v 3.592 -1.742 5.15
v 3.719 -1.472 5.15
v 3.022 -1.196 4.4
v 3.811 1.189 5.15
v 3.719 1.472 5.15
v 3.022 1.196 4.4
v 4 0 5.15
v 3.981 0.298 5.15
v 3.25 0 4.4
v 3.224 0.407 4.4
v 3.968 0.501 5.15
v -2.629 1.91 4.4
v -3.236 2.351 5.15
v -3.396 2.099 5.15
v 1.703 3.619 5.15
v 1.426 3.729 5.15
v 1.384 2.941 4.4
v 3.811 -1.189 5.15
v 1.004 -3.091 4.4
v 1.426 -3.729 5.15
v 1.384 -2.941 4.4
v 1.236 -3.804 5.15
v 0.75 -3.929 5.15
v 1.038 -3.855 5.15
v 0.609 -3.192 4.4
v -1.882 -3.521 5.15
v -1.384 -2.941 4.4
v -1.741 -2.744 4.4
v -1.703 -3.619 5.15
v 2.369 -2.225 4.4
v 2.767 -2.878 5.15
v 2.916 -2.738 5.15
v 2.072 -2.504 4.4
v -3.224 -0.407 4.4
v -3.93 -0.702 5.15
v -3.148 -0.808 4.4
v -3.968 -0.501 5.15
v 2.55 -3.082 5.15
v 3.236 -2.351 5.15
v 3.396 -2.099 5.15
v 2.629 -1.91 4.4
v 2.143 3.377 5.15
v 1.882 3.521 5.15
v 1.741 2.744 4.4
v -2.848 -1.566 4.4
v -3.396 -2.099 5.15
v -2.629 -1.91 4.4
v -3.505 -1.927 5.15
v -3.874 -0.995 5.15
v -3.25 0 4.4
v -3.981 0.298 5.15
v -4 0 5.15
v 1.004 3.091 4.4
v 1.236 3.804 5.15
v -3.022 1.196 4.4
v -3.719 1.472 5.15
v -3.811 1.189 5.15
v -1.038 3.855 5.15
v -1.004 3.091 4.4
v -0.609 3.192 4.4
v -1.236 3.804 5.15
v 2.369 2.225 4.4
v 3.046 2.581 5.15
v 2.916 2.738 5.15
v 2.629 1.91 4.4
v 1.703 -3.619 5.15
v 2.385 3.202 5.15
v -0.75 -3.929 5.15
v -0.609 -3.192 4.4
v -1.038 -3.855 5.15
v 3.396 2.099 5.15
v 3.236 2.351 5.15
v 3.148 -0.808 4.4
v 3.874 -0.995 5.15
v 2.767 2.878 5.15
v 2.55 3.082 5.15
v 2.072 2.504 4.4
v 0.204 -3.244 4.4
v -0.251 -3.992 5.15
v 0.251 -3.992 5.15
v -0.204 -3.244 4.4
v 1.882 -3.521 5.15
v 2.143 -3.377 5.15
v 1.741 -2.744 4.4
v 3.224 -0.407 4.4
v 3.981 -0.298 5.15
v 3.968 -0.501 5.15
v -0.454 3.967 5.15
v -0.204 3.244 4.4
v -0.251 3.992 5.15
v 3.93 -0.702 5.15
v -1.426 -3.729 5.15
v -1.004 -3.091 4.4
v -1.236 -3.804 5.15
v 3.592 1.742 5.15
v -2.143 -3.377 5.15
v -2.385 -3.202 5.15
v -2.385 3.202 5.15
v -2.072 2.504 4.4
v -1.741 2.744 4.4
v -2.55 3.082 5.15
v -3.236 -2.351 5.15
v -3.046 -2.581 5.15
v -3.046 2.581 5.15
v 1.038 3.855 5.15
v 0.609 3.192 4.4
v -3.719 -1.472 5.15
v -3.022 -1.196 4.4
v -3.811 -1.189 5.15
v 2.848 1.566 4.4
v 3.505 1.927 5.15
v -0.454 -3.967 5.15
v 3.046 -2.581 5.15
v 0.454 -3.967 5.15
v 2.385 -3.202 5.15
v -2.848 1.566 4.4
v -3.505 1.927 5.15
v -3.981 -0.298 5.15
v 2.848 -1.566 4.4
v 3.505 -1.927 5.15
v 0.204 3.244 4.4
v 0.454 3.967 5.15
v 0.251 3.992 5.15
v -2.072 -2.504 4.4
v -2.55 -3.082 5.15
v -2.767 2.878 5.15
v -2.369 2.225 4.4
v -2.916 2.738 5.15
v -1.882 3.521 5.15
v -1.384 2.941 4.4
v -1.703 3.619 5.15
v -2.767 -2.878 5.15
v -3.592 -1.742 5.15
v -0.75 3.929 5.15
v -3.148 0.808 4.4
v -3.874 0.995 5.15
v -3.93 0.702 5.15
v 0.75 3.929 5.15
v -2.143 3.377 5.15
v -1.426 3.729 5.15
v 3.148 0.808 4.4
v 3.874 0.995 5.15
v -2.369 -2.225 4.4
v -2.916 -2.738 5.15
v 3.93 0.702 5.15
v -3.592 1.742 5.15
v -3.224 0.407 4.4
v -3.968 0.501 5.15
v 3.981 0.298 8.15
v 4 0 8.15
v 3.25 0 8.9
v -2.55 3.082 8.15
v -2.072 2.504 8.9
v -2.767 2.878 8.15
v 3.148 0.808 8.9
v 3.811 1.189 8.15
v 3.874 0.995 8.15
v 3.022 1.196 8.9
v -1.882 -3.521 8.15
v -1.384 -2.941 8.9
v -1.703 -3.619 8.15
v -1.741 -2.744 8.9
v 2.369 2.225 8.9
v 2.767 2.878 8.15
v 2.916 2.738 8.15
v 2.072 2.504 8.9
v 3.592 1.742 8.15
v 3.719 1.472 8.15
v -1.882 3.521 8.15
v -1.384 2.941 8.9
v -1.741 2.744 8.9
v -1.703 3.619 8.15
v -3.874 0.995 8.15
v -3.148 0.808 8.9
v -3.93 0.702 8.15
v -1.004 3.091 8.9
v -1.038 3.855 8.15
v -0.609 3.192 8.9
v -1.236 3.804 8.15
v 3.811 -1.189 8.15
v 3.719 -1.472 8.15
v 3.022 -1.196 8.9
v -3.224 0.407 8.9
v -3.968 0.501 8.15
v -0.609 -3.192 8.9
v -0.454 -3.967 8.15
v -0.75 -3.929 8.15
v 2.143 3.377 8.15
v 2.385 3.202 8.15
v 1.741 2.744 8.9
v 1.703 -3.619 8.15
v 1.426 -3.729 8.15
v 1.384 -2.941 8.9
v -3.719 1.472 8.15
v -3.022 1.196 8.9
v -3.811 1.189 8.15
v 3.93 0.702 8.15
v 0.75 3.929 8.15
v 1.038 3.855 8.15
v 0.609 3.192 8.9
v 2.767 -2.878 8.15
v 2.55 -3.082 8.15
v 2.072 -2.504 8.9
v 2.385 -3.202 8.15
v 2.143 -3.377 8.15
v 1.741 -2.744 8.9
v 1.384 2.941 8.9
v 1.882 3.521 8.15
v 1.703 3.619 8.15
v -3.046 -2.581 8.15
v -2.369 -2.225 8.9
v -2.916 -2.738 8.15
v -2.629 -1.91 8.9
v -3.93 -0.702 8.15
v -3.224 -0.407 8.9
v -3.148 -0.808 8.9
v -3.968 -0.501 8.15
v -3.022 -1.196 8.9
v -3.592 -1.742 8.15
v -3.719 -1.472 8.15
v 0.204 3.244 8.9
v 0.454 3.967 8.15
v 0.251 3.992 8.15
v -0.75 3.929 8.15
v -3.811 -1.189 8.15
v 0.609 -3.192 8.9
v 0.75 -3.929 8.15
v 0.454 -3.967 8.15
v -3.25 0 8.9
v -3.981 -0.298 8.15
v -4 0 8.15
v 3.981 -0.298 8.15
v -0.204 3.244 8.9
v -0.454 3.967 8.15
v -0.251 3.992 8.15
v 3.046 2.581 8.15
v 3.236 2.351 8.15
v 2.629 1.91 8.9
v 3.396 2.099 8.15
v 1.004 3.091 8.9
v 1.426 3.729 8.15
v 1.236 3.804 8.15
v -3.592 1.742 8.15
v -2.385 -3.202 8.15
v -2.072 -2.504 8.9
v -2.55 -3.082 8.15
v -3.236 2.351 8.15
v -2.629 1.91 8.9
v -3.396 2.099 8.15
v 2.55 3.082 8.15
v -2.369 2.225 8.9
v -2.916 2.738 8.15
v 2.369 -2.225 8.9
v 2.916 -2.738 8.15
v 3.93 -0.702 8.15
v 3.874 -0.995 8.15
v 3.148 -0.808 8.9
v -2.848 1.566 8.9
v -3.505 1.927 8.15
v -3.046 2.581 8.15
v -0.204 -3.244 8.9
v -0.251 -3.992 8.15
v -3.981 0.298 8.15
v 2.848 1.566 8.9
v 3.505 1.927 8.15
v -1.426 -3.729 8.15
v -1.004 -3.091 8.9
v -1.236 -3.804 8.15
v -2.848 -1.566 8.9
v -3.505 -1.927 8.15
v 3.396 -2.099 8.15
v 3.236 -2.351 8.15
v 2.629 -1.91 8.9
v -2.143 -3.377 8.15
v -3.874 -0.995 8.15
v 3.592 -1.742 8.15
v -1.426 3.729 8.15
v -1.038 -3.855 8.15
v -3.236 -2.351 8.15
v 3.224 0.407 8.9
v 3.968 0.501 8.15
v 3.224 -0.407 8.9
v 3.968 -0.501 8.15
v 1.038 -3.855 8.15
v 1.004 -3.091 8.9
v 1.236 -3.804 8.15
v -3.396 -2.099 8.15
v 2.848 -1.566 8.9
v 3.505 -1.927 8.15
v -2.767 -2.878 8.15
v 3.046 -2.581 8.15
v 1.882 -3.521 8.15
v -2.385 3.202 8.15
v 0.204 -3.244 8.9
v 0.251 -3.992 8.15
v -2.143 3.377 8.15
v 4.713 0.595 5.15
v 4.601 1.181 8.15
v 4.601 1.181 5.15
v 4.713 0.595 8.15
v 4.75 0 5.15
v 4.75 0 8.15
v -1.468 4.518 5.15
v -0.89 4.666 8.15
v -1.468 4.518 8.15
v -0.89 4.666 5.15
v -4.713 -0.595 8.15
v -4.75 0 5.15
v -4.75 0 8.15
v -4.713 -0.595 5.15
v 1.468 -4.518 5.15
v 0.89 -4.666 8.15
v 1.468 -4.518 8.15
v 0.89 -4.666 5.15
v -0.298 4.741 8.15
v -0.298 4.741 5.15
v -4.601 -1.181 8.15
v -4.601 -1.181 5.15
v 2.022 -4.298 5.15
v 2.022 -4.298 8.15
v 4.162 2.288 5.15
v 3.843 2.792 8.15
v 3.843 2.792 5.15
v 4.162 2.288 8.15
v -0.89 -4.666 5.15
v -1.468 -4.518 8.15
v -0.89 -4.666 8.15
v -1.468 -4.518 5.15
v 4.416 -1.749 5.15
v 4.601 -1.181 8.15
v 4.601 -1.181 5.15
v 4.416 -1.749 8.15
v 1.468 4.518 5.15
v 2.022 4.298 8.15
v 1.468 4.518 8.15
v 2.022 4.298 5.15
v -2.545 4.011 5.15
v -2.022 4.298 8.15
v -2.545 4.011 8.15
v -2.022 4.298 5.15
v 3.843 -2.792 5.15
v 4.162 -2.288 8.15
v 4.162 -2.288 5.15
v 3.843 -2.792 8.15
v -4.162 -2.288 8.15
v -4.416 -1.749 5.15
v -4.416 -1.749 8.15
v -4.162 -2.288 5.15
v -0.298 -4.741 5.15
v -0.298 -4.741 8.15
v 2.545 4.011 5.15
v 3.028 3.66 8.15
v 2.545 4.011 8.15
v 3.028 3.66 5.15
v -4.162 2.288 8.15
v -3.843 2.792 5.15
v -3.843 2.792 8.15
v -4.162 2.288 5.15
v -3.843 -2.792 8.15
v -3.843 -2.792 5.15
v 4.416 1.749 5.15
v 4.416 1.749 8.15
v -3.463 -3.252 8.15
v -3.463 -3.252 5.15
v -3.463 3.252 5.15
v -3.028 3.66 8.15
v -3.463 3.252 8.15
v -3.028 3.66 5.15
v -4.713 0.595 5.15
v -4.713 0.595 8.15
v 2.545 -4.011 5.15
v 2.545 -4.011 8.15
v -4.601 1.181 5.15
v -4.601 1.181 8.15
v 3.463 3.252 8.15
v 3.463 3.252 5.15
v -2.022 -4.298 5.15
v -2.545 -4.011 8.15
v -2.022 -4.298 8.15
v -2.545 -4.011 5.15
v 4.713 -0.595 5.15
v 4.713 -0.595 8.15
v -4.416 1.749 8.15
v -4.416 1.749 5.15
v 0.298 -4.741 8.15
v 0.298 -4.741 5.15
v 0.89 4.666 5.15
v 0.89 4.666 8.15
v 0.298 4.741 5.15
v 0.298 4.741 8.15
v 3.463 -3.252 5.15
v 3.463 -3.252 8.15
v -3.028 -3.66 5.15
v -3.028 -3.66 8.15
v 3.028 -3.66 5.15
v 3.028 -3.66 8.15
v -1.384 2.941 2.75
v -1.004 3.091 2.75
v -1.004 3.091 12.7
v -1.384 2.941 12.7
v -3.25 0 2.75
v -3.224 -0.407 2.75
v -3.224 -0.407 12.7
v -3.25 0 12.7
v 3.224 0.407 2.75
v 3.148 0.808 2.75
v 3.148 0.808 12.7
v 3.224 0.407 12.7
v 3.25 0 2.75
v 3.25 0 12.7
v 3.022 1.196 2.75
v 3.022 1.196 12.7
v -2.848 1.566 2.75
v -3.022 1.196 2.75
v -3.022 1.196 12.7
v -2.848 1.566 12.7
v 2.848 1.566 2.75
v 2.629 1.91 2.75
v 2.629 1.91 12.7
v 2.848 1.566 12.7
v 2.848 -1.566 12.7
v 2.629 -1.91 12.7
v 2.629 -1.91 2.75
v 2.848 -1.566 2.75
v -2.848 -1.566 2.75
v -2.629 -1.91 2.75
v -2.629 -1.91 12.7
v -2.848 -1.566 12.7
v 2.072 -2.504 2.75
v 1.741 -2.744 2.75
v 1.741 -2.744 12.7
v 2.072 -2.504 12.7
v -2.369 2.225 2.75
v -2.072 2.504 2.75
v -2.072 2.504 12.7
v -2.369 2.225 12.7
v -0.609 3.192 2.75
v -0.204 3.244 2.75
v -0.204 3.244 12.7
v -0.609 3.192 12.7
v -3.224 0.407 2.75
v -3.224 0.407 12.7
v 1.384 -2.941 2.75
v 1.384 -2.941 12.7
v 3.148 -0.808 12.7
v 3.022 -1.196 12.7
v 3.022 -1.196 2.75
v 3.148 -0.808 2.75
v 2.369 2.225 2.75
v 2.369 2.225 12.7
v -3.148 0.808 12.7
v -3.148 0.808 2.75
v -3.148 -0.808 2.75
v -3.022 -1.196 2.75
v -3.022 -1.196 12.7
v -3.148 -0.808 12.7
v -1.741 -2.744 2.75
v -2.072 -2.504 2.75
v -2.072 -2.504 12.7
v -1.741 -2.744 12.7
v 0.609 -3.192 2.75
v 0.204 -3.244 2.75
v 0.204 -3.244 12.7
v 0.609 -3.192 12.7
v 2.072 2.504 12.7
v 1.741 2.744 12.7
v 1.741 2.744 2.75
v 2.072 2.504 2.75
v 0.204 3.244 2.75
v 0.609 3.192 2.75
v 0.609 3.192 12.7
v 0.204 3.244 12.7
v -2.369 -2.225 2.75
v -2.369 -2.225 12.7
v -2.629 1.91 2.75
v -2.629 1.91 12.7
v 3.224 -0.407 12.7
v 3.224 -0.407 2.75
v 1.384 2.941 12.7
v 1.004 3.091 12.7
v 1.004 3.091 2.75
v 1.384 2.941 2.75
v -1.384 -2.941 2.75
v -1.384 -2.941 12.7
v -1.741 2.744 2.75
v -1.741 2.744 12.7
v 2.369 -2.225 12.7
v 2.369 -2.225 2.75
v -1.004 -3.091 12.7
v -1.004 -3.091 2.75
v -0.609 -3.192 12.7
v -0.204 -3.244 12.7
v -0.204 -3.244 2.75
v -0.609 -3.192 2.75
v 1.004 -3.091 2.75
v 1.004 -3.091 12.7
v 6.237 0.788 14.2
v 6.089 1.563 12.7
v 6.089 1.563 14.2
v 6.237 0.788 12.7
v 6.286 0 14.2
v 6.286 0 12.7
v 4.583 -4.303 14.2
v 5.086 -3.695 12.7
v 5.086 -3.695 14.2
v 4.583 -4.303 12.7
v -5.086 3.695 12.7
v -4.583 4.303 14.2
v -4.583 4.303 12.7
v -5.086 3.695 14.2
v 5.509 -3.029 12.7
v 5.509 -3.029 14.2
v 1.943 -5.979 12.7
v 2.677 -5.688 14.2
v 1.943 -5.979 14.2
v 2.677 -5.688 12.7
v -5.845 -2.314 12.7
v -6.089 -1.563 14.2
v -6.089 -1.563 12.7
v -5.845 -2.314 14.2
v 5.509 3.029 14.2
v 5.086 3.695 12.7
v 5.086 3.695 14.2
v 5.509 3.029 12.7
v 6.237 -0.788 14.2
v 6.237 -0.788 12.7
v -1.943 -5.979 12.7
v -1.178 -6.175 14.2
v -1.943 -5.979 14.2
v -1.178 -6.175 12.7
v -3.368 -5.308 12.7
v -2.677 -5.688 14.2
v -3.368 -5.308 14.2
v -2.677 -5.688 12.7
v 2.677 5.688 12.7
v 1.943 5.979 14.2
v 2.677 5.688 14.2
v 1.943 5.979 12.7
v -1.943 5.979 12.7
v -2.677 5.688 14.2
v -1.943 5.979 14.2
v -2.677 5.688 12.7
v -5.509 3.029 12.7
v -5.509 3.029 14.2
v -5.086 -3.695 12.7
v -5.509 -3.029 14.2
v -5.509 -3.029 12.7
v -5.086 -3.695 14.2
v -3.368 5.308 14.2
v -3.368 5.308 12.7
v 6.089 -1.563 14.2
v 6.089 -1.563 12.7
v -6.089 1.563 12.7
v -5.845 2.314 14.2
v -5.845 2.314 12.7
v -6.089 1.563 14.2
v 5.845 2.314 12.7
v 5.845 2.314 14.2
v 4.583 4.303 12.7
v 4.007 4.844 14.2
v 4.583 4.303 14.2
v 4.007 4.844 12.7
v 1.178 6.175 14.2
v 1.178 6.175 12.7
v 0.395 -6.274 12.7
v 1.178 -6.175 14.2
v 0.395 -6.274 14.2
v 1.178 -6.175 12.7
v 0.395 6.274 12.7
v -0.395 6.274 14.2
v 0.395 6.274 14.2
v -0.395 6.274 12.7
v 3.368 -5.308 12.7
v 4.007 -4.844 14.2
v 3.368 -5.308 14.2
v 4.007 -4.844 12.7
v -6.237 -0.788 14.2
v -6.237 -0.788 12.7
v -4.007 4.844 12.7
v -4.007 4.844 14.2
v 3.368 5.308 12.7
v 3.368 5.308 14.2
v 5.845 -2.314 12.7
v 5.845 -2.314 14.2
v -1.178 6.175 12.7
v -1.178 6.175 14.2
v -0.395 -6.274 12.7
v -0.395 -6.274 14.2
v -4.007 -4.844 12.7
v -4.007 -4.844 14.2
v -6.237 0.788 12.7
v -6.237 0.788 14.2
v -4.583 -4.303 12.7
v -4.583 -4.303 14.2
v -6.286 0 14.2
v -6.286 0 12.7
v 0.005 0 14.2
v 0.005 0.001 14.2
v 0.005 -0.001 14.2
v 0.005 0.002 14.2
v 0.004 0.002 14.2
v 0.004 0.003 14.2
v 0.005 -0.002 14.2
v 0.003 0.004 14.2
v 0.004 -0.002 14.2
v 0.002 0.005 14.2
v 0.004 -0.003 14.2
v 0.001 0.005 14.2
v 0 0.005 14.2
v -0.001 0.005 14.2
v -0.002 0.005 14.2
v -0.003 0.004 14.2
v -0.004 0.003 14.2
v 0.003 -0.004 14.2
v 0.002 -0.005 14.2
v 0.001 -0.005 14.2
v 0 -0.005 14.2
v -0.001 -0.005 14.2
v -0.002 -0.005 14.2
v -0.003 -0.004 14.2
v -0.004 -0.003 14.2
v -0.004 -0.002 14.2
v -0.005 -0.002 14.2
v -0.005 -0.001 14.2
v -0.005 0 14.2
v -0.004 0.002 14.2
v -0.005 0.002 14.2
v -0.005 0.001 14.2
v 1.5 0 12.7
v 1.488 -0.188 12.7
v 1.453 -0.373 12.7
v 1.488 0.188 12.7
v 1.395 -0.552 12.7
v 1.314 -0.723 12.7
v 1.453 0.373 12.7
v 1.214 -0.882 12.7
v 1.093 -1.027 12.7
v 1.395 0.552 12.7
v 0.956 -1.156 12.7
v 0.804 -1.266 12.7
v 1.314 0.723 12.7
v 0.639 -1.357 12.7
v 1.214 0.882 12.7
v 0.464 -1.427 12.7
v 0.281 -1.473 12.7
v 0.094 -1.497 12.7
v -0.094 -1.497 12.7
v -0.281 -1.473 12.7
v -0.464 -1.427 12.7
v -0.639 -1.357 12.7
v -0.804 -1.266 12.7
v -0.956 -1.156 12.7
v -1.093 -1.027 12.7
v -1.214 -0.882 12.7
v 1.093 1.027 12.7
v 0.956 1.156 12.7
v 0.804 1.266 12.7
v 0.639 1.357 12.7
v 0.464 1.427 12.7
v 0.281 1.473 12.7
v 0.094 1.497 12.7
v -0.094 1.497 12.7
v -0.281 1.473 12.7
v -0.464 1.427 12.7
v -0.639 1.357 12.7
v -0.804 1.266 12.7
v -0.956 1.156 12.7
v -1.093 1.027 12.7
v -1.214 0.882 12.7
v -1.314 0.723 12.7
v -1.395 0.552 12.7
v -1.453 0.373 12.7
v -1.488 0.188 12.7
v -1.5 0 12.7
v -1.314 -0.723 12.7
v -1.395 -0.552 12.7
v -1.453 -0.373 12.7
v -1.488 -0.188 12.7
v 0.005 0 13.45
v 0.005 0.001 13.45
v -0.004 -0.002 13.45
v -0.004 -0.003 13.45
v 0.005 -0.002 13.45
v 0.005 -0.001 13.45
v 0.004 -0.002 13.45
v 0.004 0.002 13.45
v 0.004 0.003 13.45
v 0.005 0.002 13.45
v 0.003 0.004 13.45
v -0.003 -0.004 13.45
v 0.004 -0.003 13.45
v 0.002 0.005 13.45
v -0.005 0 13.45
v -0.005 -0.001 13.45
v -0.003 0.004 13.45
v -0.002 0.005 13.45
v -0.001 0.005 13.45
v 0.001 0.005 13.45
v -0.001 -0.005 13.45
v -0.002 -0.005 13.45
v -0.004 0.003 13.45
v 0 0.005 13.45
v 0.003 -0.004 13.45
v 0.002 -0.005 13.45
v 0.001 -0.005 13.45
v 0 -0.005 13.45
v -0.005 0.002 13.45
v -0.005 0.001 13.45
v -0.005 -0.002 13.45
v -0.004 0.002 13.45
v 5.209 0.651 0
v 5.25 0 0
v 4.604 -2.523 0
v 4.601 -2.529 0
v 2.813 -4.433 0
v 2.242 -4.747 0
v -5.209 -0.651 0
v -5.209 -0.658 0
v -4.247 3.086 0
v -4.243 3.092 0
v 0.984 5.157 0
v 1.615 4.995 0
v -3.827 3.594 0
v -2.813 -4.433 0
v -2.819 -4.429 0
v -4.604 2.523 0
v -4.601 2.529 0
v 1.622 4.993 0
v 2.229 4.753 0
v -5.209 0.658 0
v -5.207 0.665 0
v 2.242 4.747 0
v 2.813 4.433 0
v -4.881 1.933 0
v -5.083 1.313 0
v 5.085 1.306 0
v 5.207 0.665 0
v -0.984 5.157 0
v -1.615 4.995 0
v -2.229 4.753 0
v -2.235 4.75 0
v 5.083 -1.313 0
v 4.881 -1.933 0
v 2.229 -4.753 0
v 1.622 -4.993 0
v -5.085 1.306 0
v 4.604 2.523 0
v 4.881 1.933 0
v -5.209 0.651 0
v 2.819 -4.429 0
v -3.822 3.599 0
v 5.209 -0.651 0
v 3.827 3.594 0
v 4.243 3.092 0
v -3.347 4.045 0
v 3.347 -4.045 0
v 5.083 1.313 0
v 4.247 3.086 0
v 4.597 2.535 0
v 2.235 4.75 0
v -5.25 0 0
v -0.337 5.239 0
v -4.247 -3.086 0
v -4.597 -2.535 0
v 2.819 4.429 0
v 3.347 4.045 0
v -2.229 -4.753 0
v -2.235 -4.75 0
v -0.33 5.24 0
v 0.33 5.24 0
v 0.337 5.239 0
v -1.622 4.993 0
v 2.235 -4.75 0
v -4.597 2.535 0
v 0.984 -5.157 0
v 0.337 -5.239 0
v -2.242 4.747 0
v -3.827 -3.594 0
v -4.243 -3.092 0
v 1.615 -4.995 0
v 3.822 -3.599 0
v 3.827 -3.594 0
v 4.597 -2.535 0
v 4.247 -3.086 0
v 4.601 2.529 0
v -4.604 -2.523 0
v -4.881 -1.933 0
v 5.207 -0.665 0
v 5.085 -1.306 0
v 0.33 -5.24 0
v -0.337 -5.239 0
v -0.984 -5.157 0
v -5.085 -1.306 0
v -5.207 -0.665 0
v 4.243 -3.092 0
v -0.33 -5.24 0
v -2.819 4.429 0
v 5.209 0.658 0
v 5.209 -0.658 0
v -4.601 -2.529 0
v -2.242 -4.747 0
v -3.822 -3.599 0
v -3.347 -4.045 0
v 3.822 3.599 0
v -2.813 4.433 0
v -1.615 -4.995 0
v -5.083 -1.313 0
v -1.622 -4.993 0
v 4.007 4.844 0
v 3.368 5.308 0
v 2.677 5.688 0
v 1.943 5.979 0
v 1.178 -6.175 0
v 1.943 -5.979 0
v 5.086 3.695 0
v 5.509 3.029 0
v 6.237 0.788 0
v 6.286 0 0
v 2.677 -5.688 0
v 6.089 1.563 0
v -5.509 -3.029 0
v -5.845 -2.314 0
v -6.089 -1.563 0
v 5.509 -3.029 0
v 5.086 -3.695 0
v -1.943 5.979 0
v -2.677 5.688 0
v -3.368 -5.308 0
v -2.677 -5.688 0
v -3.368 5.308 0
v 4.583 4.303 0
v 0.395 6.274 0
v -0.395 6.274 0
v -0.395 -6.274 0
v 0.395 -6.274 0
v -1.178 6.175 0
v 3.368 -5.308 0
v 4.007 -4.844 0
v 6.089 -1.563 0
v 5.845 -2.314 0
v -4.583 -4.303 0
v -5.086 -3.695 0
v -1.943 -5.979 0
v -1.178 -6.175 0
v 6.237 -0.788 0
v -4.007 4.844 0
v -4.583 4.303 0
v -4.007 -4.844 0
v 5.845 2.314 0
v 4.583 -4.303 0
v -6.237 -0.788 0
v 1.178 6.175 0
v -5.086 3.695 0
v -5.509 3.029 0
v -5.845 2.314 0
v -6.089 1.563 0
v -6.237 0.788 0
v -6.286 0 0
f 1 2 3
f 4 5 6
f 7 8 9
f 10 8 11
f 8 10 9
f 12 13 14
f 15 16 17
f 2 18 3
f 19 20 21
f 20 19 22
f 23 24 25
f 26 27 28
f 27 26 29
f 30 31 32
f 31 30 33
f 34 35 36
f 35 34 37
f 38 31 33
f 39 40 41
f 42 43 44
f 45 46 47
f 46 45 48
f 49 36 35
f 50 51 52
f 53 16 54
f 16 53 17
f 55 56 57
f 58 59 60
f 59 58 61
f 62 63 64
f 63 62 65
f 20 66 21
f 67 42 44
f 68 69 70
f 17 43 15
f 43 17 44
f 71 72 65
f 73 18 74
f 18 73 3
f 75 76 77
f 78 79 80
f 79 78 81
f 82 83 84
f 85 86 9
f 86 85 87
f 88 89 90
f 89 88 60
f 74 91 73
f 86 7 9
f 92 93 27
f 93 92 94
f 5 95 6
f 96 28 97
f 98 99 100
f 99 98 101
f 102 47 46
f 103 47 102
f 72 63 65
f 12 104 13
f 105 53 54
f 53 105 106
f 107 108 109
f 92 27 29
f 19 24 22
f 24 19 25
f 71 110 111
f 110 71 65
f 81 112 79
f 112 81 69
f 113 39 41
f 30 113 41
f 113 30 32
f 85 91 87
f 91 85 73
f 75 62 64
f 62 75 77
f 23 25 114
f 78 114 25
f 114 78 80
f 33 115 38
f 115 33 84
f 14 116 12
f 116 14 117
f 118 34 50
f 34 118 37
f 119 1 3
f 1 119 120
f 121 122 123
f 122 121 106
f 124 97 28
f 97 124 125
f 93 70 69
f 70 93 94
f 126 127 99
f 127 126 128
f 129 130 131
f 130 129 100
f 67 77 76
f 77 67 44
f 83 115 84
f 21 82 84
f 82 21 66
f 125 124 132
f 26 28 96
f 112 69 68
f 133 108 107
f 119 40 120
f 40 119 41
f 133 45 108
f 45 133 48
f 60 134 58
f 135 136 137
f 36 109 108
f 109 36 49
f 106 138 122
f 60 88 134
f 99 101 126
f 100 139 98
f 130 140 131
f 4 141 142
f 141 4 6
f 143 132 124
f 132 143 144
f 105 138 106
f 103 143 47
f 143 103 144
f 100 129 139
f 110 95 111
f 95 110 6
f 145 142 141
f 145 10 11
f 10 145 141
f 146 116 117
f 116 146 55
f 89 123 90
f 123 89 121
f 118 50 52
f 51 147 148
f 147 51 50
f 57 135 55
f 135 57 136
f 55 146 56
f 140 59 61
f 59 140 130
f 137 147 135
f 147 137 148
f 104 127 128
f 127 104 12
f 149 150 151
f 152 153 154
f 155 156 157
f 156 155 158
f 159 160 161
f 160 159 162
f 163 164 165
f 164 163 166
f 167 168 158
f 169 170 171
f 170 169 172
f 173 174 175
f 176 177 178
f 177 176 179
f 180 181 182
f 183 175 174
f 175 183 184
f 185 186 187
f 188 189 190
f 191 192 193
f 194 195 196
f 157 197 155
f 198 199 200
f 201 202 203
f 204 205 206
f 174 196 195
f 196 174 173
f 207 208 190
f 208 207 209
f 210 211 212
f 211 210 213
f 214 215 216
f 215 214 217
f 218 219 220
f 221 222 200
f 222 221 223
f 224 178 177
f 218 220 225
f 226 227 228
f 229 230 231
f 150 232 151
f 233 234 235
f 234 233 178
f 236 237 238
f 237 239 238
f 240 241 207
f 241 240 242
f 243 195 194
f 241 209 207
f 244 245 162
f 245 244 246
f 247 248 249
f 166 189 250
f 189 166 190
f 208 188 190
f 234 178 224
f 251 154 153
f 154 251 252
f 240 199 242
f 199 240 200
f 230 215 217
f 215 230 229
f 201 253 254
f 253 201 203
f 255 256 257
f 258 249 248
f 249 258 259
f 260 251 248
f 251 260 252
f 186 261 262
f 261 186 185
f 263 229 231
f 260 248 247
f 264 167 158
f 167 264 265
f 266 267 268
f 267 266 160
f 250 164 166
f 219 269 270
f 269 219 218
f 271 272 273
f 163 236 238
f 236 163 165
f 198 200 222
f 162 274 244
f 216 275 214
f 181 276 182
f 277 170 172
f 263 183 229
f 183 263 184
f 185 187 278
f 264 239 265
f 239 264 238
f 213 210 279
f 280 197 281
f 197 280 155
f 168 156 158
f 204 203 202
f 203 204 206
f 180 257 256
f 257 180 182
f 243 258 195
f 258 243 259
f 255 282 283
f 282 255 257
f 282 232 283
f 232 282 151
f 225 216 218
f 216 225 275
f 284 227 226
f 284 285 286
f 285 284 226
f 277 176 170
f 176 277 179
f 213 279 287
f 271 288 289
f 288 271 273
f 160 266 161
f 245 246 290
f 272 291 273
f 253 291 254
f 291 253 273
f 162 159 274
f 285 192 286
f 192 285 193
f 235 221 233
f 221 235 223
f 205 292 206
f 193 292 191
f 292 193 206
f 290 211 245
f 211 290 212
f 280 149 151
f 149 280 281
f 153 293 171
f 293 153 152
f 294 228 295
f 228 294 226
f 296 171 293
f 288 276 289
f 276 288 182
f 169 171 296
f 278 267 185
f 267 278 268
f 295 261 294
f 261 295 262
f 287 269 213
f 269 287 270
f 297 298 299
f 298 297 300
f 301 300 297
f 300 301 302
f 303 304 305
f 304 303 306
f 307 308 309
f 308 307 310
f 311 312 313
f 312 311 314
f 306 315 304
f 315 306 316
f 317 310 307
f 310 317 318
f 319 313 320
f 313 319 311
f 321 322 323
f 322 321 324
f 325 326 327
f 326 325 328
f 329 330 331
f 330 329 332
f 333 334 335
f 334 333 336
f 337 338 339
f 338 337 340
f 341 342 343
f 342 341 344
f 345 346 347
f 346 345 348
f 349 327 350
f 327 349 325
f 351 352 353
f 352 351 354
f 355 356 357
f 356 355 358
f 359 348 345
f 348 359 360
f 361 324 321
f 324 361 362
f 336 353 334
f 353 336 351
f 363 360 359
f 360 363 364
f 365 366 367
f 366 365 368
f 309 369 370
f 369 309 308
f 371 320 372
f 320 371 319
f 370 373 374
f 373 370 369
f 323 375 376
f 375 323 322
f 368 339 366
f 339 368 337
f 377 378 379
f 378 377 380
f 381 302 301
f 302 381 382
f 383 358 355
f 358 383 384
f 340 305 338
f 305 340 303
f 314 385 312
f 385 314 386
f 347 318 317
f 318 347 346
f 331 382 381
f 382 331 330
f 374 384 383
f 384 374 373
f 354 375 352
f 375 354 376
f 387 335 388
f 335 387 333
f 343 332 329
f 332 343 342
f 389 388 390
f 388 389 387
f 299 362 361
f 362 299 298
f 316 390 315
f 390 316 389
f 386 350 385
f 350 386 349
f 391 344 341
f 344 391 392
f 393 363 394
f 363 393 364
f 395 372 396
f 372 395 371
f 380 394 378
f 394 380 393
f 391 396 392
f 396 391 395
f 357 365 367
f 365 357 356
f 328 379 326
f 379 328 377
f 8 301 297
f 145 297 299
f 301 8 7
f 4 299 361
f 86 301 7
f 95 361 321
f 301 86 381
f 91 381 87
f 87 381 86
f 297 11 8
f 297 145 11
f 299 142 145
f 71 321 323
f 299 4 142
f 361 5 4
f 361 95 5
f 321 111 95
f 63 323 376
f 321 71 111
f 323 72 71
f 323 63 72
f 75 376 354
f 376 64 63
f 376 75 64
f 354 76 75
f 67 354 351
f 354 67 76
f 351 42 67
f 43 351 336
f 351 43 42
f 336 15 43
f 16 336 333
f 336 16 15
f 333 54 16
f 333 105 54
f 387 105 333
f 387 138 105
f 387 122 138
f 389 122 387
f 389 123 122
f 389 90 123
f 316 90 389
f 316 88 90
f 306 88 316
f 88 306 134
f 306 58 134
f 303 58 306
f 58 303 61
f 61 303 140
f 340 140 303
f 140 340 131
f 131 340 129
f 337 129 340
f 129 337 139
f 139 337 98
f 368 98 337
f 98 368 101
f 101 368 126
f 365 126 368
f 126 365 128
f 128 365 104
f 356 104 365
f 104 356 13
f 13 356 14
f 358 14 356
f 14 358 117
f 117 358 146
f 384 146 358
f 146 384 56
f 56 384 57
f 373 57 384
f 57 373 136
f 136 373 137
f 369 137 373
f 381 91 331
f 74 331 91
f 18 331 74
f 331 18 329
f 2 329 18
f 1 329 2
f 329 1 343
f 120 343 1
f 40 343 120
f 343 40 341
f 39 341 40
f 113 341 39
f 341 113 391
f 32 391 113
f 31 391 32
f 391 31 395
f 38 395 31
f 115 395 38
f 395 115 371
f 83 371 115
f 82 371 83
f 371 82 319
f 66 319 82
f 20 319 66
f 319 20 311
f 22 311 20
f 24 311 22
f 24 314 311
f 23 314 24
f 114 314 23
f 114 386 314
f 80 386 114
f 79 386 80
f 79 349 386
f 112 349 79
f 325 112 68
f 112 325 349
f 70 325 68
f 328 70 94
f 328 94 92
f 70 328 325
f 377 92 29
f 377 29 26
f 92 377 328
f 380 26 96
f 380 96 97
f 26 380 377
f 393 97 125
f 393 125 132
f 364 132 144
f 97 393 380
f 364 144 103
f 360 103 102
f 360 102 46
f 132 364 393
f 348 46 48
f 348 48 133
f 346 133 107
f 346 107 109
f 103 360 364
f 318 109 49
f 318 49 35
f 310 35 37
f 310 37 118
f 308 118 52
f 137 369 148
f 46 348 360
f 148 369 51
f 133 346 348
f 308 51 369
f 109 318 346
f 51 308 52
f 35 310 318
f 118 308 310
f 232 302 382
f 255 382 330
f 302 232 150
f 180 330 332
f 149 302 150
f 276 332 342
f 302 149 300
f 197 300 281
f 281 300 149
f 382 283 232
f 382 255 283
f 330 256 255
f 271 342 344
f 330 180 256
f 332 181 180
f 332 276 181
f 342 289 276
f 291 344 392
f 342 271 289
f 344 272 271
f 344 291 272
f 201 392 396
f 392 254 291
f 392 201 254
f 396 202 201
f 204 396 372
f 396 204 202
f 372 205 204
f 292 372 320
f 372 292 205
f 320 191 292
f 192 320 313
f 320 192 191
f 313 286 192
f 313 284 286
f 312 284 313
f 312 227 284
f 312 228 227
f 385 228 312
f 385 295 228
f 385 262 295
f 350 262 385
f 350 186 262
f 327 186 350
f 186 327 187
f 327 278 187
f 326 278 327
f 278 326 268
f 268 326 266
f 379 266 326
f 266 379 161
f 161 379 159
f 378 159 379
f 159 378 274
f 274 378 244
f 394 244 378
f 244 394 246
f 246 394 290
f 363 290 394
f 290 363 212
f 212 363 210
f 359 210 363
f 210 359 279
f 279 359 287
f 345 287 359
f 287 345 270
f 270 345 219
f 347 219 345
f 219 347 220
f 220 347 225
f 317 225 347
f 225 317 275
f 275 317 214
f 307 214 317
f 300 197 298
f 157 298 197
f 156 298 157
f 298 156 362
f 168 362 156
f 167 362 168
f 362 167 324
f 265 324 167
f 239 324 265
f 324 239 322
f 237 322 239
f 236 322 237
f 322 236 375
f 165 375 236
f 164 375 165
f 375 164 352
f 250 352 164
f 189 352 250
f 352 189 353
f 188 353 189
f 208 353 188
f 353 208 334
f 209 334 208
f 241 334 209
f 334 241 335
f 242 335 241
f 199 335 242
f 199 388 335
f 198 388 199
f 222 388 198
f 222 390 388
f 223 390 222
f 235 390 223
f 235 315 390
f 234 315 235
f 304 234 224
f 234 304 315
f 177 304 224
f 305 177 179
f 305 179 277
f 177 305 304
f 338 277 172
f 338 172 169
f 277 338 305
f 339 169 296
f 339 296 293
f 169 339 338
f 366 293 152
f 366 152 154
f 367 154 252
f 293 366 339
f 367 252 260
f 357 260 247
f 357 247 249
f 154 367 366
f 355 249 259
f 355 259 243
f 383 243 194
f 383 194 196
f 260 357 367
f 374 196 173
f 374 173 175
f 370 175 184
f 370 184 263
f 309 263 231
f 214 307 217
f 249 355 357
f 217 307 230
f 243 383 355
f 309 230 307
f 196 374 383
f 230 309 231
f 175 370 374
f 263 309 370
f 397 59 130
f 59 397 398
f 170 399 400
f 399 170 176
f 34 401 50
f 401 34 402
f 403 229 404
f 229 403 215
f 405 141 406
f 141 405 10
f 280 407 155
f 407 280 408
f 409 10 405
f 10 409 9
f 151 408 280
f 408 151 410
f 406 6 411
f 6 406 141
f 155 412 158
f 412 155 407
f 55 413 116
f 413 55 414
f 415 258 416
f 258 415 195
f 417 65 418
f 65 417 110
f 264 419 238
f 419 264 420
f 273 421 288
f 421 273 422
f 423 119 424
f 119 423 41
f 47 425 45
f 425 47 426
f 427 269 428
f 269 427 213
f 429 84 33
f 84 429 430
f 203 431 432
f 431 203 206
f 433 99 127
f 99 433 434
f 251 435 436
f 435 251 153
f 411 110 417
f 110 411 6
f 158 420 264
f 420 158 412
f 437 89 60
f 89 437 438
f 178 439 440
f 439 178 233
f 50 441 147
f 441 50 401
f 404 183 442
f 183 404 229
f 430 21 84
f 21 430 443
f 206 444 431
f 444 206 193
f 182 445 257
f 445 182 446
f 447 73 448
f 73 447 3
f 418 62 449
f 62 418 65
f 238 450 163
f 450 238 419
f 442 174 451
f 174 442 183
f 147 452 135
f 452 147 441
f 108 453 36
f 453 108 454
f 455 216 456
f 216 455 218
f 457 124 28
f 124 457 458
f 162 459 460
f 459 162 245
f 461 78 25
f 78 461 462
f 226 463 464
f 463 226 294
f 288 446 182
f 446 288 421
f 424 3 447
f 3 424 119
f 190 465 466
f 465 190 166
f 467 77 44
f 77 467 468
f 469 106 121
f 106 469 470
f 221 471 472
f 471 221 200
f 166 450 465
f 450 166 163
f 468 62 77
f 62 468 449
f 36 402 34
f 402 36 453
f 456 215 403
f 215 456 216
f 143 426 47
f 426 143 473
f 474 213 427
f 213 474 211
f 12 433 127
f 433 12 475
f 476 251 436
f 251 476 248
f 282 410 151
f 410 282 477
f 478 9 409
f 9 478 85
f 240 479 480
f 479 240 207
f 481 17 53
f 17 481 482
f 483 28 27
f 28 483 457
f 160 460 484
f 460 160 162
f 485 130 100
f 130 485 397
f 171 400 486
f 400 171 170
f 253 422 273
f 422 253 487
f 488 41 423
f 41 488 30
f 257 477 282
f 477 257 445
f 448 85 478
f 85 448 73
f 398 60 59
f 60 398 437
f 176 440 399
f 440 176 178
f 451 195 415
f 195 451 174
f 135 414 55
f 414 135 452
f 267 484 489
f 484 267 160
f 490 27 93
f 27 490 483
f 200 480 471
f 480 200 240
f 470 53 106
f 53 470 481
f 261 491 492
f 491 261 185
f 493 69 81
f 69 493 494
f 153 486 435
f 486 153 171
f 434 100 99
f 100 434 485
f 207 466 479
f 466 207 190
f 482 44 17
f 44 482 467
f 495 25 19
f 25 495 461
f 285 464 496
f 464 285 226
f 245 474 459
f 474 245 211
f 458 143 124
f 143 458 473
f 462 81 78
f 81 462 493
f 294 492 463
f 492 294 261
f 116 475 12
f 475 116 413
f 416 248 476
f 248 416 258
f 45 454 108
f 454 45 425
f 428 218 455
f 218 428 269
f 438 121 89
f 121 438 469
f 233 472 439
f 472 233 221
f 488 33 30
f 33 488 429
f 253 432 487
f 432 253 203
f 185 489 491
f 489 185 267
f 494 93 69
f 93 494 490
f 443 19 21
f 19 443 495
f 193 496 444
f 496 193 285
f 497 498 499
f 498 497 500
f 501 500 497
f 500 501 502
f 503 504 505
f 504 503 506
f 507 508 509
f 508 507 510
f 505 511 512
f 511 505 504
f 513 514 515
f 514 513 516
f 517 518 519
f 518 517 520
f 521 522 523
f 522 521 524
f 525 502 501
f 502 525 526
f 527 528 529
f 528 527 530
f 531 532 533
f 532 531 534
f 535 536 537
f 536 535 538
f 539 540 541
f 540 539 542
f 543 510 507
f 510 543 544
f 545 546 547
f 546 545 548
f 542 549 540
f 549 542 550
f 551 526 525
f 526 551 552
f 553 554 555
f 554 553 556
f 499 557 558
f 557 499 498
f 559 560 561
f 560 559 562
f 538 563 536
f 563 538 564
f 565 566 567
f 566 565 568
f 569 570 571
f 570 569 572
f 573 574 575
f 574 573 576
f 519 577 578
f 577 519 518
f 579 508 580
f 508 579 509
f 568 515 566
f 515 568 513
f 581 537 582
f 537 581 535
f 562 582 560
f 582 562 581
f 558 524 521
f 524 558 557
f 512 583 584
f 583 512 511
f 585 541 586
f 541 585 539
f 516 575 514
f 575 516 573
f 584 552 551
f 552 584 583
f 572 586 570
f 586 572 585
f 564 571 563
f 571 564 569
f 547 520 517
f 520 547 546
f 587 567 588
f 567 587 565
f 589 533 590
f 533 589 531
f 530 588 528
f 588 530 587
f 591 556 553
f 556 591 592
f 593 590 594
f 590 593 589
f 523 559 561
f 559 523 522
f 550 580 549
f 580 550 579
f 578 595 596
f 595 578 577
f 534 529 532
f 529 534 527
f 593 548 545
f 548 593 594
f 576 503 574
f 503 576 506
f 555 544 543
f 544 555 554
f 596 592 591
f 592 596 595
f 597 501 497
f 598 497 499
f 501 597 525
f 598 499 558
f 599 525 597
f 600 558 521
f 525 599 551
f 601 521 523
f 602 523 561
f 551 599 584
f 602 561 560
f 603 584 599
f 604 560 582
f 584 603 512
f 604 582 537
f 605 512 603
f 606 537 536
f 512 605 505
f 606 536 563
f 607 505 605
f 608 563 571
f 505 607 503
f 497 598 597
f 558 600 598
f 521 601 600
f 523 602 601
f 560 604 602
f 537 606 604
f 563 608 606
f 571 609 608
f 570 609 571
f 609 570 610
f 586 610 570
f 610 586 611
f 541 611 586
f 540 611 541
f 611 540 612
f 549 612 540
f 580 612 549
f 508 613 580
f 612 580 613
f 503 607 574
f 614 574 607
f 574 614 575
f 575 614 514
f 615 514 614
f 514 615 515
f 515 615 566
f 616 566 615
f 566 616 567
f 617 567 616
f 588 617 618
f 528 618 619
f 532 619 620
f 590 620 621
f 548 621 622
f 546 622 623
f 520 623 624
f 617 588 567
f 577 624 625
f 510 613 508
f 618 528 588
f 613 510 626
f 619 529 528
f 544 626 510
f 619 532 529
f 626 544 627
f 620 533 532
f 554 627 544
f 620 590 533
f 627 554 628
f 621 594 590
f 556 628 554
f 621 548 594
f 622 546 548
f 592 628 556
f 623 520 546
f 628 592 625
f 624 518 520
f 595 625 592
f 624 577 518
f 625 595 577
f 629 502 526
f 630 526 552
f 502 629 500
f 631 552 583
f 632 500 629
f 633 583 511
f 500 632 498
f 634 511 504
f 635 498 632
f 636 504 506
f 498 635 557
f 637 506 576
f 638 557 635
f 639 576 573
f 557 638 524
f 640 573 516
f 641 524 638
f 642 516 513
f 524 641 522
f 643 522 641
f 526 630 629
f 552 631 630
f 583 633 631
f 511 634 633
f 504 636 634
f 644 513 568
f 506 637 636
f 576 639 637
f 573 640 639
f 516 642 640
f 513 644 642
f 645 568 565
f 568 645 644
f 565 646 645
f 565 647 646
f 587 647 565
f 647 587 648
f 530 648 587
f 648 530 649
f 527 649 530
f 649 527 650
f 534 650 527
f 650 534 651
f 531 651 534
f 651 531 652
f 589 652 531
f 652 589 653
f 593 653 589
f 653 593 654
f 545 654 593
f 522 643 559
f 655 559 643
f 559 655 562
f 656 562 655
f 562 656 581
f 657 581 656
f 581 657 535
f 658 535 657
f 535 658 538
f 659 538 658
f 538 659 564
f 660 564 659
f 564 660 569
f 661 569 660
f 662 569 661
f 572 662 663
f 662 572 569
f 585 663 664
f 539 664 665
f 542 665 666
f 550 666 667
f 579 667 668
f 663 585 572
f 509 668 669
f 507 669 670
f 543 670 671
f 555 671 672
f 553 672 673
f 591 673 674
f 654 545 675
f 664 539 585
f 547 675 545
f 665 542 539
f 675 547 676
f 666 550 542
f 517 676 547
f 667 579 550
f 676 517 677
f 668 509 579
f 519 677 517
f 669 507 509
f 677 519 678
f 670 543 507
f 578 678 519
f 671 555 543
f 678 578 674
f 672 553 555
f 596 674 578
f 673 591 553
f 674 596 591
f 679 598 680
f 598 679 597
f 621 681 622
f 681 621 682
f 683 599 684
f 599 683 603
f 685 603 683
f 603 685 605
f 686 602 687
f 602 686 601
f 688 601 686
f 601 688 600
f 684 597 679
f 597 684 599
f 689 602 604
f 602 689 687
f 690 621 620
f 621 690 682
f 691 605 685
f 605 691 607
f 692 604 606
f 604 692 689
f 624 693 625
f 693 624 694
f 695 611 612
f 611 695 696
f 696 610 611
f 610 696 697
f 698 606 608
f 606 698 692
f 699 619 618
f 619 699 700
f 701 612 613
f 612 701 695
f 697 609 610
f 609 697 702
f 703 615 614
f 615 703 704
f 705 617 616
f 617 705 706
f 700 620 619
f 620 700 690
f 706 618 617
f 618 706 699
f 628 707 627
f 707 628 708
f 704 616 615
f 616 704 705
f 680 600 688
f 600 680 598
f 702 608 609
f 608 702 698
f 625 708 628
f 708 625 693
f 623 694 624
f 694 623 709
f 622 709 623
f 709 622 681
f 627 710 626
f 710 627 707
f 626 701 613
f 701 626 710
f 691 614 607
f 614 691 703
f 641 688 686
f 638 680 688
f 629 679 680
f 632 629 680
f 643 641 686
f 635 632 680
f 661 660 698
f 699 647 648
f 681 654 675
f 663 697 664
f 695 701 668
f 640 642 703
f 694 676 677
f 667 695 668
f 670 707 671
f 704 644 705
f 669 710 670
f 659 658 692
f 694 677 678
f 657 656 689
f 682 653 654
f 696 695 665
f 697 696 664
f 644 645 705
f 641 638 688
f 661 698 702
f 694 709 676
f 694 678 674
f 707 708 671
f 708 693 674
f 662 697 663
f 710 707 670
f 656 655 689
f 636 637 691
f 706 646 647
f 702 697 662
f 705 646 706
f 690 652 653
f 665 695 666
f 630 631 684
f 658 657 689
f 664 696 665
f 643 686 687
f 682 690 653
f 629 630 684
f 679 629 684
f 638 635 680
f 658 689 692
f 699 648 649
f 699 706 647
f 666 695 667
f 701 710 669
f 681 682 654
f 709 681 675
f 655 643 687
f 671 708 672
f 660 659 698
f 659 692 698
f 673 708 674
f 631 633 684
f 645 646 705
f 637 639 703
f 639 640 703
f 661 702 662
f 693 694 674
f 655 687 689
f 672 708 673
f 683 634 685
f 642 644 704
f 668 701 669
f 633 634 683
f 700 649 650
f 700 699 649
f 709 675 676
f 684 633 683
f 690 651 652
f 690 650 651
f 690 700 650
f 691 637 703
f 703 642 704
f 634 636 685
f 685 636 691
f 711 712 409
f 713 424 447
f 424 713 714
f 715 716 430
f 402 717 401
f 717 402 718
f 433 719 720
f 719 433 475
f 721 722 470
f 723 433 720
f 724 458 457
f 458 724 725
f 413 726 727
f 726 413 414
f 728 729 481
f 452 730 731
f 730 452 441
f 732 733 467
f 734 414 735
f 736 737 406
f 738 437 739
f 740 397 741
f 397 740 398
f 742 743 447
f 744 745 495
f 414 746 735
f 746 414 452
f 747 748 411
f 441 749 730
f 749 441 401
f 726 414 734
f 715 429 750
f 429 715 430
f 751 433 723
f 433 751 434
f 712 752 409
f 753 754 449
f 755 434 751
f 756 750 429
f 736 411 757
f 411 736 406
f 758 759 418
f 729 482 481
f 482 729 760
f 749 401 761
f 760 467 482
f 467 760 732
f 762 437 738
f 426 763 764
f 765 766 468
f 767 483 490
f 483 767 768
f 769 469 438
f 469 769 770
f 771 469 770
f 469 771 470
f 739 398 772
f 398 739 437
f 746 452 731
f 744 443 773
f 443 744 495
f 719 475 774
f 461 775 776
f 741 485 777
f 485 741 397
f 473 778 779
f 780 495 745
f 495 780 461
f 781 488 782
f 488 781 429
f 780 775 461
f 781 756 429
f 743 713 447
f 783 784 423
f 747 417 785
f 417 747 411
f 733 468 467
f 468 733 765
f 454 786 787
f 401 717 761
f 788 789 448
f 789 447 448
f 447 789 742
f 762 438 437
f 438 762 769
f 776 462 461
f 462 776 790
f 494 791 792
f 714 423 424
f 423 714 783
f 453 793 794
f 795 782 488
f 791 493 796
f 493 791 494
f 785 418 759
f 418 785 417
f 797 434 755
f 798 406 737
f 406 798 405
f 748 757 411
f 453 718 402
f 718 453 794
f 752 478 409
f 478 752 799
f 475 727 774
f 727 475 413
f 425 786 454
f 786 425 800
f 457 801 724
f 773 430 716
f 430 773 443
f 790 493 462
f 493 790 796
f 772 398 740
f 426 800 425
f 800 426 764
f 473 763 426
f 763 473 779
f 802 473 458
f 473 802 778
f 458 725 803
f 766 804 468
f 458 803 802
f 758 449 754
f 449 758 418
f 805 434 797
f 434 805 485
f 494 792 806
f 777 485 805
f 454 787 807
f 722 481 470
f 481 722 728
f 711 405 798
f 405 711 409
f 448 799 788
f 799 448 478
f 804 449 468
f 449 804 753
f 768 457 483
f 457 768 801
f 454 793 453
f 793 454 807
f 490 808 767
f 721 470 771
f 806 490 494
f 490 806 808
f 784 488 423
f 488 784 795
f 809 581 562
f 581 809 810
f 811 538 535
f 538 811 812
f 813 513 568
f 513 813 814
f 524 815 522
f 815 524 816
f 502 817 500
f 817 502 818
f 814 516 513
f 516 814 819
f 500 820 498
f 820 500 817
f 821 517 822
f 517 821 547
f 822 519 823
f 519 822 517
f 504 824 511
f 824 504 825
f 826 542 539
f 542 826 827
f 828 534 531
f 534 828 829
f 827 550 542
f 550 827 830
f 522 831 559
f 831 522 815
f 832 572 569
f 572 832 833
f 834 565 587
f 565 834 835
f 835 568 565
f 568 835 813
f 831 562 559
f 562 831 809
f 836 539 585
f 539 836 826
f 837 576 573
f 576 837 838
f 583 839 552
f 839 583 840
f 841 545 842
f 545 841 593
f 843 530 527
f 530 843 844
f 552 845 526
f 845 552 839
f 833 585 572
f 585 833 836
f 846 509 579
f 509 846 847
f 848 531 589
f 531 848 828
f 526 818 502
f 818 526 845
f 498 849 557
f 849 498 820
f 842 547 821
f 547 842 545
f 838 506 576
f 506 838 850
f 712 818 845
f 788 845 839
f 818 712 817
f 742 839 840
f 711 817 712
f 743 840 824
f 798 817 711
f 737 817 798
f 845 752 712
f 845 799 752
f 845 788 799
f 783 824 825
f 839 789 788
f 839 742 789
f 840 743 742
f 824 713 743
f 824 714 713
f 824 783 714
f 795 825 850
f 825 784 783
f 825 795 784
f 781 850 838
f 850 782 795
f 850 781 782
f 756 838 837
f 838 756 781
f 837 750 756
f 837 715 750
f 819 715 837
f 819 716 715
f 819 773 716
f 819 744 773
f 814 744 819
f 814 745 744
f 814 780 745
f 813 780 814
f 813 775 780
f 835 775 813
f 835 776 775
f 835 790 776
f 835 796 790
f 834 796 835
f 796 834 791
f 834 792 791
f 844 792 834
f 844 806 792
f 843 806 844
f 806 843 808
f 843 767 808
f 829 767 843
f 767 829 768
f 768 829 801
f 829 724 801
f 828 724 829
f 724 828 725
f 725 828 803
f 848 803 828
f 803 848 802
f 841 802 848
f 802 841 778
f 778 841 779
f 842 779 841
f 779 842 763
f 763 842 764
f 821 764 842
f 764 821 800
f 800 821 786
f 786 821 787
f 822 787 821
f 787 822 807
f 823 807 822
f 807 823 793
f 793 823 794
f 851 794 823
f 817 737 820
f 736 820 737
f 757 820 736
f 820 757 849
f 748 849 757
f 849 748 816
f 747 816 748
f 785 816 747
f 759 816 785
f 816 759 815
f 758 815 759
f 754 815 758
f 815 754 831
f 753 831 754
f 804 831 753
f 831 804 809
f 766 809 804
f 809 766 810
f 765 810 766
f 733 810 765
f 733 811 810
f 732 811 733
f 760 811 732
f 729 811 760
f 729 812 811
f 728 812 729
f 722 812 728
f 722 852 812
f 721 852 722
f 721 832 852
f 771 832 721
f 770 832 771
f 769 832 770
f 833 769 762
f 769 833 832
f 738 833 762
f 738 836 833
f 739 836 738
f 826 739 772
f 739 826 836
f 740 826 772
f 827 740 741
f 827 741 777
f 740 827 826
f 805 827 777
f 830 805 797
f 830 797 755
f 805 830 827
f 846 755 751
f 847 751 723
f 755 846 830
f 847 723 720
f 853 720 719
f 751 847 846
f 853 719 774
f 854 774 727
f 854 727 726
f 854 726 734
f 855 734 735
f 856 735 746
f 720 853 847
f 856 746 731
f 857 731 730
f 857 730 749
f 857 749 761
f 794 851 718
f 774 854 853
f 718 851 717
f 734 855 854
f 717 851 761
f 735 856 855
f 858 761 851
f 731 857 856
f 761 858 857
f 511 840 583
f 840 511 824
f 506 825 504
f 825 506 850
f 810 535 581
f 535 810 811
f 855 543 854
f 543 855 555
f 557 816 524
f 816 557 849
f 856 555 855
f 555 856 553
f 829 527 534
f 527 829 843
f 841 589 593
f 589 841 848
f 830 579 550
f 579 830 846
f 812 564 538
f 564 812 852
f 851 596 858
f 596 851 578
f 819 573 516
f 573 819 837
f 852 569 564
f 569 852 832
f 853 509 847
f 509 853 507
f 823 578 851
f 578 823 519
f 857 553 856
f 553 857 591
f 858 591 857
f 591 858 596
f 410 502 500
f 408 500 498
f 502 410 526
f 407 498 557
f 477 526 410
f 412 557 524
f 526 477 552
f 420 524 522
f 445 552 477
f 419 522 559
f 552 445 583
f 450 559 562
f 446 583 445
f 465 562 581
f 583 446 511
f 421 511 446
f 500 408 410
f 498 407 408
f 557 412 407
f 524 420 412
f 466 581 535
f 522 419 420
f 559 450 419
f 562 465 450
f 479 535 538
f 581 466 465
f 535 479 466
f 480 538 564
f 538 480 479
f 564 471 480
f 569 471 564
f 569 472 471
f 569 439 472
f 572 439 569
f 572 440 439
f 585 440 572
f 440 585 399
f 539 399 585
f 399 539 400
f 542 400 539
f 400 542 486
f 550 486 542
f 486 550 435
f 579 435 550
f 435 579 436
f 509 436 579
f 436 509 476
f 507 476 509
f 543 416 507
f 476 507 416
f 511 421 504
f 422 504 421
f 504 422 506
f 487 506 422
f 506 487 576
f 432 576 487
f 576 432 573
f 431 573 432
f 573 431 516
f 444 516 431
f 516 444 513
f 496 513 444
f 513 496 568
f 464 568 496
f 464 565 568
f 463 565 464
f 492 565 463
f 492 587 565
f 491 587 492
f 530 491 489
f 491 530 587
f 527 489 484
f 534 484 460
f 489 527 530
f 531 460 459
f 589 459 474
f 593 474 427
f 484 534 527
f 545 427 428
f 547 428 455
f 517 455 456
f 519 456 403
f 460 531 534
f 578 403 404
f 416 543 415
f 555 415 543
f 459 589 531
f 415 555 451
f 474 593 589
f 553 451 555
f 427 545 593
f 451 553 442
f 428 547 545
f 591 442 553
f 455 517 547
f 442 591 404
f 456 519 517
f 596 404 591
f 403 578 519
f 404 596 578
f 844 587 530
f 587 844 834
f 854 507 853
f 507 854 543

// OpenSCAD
$fn = 50;
 union() {
     difference() {
         translate([0.0, 0.0, 6.35]) {
             cylinder(r=6.2865, h=12.7, center=true);
        }

         union() {
             translate([0.0, 0.0, 2.6999999999999993]) {
                 union() {
                     translate([0.0, 0.0, 5.0]) {
                         cylinder(r=3.25, h=10.0, center=true);
                    }

                     translate([0.0, 0.0, 3.95]) {
                         union() {
                             cylinder(r=4.75, h=3.0, center=true);
                             translate([0.0, 0.0, -1.5]) {
                                 render() {
                                     difference() {
                                         cylinder(r1=3.25, r2=4.75, h=1.5, center=true);
                                         cylinder(r1=1.75, r2=3.4125, h=1.8, center=true);
                                    }

                                }

                            }

                             translate([0.0, 0.0, 1.5]) {
                                 render() {
                                     difference() {
                                         cylinder(r1=4.75, r2=3.25, h=1.5, center=true);
                                         cylinder(r1=3.4125, r2=1.75, h=1.8, center=true);
                                    }

                                }

                            }

                        }

                    }

                }

            }

             translate([0.0, 0.0, 1.3499999999999996]) {
                 cylinder(r1=5.2865, r2=3.25, h=2.8, center=true);
            }

             translate([0.0, 0.0, 12.7]) {
                 translate([0.0, 0.0, 0.75]) {
                     difference() {
                         render() {
                             difference() {
                                 cylinder(r=6.2865, h=1.5, center=true);
                                 cylinder(r=0.005, h=1.5, center=true);
                            }

                        }

                         translate([0.0, 0.0, -0.375]) {
                             cylinder(r1=1.5, r2=0.005, h=0.75, center=true);
                        }

                    }

                }

            }

        }

    }

     translate([0.0, 0.0, 12.7]) {
         translate([0.0, 0.0, 0.75]) {
             difference() {
                 render() {
                     difference() {
                         cylinder(r=6.2865, h=1.5, center=true);
                         cylinder(r=0.005, h=1.5, center=true);
                    }

                }

                 translate([0.0, 0.0, -0.375]) {
                     cylinder(r1=1.5, r2=0.005, h=0.75, center=true);
                }

            }

        }

    }

}
